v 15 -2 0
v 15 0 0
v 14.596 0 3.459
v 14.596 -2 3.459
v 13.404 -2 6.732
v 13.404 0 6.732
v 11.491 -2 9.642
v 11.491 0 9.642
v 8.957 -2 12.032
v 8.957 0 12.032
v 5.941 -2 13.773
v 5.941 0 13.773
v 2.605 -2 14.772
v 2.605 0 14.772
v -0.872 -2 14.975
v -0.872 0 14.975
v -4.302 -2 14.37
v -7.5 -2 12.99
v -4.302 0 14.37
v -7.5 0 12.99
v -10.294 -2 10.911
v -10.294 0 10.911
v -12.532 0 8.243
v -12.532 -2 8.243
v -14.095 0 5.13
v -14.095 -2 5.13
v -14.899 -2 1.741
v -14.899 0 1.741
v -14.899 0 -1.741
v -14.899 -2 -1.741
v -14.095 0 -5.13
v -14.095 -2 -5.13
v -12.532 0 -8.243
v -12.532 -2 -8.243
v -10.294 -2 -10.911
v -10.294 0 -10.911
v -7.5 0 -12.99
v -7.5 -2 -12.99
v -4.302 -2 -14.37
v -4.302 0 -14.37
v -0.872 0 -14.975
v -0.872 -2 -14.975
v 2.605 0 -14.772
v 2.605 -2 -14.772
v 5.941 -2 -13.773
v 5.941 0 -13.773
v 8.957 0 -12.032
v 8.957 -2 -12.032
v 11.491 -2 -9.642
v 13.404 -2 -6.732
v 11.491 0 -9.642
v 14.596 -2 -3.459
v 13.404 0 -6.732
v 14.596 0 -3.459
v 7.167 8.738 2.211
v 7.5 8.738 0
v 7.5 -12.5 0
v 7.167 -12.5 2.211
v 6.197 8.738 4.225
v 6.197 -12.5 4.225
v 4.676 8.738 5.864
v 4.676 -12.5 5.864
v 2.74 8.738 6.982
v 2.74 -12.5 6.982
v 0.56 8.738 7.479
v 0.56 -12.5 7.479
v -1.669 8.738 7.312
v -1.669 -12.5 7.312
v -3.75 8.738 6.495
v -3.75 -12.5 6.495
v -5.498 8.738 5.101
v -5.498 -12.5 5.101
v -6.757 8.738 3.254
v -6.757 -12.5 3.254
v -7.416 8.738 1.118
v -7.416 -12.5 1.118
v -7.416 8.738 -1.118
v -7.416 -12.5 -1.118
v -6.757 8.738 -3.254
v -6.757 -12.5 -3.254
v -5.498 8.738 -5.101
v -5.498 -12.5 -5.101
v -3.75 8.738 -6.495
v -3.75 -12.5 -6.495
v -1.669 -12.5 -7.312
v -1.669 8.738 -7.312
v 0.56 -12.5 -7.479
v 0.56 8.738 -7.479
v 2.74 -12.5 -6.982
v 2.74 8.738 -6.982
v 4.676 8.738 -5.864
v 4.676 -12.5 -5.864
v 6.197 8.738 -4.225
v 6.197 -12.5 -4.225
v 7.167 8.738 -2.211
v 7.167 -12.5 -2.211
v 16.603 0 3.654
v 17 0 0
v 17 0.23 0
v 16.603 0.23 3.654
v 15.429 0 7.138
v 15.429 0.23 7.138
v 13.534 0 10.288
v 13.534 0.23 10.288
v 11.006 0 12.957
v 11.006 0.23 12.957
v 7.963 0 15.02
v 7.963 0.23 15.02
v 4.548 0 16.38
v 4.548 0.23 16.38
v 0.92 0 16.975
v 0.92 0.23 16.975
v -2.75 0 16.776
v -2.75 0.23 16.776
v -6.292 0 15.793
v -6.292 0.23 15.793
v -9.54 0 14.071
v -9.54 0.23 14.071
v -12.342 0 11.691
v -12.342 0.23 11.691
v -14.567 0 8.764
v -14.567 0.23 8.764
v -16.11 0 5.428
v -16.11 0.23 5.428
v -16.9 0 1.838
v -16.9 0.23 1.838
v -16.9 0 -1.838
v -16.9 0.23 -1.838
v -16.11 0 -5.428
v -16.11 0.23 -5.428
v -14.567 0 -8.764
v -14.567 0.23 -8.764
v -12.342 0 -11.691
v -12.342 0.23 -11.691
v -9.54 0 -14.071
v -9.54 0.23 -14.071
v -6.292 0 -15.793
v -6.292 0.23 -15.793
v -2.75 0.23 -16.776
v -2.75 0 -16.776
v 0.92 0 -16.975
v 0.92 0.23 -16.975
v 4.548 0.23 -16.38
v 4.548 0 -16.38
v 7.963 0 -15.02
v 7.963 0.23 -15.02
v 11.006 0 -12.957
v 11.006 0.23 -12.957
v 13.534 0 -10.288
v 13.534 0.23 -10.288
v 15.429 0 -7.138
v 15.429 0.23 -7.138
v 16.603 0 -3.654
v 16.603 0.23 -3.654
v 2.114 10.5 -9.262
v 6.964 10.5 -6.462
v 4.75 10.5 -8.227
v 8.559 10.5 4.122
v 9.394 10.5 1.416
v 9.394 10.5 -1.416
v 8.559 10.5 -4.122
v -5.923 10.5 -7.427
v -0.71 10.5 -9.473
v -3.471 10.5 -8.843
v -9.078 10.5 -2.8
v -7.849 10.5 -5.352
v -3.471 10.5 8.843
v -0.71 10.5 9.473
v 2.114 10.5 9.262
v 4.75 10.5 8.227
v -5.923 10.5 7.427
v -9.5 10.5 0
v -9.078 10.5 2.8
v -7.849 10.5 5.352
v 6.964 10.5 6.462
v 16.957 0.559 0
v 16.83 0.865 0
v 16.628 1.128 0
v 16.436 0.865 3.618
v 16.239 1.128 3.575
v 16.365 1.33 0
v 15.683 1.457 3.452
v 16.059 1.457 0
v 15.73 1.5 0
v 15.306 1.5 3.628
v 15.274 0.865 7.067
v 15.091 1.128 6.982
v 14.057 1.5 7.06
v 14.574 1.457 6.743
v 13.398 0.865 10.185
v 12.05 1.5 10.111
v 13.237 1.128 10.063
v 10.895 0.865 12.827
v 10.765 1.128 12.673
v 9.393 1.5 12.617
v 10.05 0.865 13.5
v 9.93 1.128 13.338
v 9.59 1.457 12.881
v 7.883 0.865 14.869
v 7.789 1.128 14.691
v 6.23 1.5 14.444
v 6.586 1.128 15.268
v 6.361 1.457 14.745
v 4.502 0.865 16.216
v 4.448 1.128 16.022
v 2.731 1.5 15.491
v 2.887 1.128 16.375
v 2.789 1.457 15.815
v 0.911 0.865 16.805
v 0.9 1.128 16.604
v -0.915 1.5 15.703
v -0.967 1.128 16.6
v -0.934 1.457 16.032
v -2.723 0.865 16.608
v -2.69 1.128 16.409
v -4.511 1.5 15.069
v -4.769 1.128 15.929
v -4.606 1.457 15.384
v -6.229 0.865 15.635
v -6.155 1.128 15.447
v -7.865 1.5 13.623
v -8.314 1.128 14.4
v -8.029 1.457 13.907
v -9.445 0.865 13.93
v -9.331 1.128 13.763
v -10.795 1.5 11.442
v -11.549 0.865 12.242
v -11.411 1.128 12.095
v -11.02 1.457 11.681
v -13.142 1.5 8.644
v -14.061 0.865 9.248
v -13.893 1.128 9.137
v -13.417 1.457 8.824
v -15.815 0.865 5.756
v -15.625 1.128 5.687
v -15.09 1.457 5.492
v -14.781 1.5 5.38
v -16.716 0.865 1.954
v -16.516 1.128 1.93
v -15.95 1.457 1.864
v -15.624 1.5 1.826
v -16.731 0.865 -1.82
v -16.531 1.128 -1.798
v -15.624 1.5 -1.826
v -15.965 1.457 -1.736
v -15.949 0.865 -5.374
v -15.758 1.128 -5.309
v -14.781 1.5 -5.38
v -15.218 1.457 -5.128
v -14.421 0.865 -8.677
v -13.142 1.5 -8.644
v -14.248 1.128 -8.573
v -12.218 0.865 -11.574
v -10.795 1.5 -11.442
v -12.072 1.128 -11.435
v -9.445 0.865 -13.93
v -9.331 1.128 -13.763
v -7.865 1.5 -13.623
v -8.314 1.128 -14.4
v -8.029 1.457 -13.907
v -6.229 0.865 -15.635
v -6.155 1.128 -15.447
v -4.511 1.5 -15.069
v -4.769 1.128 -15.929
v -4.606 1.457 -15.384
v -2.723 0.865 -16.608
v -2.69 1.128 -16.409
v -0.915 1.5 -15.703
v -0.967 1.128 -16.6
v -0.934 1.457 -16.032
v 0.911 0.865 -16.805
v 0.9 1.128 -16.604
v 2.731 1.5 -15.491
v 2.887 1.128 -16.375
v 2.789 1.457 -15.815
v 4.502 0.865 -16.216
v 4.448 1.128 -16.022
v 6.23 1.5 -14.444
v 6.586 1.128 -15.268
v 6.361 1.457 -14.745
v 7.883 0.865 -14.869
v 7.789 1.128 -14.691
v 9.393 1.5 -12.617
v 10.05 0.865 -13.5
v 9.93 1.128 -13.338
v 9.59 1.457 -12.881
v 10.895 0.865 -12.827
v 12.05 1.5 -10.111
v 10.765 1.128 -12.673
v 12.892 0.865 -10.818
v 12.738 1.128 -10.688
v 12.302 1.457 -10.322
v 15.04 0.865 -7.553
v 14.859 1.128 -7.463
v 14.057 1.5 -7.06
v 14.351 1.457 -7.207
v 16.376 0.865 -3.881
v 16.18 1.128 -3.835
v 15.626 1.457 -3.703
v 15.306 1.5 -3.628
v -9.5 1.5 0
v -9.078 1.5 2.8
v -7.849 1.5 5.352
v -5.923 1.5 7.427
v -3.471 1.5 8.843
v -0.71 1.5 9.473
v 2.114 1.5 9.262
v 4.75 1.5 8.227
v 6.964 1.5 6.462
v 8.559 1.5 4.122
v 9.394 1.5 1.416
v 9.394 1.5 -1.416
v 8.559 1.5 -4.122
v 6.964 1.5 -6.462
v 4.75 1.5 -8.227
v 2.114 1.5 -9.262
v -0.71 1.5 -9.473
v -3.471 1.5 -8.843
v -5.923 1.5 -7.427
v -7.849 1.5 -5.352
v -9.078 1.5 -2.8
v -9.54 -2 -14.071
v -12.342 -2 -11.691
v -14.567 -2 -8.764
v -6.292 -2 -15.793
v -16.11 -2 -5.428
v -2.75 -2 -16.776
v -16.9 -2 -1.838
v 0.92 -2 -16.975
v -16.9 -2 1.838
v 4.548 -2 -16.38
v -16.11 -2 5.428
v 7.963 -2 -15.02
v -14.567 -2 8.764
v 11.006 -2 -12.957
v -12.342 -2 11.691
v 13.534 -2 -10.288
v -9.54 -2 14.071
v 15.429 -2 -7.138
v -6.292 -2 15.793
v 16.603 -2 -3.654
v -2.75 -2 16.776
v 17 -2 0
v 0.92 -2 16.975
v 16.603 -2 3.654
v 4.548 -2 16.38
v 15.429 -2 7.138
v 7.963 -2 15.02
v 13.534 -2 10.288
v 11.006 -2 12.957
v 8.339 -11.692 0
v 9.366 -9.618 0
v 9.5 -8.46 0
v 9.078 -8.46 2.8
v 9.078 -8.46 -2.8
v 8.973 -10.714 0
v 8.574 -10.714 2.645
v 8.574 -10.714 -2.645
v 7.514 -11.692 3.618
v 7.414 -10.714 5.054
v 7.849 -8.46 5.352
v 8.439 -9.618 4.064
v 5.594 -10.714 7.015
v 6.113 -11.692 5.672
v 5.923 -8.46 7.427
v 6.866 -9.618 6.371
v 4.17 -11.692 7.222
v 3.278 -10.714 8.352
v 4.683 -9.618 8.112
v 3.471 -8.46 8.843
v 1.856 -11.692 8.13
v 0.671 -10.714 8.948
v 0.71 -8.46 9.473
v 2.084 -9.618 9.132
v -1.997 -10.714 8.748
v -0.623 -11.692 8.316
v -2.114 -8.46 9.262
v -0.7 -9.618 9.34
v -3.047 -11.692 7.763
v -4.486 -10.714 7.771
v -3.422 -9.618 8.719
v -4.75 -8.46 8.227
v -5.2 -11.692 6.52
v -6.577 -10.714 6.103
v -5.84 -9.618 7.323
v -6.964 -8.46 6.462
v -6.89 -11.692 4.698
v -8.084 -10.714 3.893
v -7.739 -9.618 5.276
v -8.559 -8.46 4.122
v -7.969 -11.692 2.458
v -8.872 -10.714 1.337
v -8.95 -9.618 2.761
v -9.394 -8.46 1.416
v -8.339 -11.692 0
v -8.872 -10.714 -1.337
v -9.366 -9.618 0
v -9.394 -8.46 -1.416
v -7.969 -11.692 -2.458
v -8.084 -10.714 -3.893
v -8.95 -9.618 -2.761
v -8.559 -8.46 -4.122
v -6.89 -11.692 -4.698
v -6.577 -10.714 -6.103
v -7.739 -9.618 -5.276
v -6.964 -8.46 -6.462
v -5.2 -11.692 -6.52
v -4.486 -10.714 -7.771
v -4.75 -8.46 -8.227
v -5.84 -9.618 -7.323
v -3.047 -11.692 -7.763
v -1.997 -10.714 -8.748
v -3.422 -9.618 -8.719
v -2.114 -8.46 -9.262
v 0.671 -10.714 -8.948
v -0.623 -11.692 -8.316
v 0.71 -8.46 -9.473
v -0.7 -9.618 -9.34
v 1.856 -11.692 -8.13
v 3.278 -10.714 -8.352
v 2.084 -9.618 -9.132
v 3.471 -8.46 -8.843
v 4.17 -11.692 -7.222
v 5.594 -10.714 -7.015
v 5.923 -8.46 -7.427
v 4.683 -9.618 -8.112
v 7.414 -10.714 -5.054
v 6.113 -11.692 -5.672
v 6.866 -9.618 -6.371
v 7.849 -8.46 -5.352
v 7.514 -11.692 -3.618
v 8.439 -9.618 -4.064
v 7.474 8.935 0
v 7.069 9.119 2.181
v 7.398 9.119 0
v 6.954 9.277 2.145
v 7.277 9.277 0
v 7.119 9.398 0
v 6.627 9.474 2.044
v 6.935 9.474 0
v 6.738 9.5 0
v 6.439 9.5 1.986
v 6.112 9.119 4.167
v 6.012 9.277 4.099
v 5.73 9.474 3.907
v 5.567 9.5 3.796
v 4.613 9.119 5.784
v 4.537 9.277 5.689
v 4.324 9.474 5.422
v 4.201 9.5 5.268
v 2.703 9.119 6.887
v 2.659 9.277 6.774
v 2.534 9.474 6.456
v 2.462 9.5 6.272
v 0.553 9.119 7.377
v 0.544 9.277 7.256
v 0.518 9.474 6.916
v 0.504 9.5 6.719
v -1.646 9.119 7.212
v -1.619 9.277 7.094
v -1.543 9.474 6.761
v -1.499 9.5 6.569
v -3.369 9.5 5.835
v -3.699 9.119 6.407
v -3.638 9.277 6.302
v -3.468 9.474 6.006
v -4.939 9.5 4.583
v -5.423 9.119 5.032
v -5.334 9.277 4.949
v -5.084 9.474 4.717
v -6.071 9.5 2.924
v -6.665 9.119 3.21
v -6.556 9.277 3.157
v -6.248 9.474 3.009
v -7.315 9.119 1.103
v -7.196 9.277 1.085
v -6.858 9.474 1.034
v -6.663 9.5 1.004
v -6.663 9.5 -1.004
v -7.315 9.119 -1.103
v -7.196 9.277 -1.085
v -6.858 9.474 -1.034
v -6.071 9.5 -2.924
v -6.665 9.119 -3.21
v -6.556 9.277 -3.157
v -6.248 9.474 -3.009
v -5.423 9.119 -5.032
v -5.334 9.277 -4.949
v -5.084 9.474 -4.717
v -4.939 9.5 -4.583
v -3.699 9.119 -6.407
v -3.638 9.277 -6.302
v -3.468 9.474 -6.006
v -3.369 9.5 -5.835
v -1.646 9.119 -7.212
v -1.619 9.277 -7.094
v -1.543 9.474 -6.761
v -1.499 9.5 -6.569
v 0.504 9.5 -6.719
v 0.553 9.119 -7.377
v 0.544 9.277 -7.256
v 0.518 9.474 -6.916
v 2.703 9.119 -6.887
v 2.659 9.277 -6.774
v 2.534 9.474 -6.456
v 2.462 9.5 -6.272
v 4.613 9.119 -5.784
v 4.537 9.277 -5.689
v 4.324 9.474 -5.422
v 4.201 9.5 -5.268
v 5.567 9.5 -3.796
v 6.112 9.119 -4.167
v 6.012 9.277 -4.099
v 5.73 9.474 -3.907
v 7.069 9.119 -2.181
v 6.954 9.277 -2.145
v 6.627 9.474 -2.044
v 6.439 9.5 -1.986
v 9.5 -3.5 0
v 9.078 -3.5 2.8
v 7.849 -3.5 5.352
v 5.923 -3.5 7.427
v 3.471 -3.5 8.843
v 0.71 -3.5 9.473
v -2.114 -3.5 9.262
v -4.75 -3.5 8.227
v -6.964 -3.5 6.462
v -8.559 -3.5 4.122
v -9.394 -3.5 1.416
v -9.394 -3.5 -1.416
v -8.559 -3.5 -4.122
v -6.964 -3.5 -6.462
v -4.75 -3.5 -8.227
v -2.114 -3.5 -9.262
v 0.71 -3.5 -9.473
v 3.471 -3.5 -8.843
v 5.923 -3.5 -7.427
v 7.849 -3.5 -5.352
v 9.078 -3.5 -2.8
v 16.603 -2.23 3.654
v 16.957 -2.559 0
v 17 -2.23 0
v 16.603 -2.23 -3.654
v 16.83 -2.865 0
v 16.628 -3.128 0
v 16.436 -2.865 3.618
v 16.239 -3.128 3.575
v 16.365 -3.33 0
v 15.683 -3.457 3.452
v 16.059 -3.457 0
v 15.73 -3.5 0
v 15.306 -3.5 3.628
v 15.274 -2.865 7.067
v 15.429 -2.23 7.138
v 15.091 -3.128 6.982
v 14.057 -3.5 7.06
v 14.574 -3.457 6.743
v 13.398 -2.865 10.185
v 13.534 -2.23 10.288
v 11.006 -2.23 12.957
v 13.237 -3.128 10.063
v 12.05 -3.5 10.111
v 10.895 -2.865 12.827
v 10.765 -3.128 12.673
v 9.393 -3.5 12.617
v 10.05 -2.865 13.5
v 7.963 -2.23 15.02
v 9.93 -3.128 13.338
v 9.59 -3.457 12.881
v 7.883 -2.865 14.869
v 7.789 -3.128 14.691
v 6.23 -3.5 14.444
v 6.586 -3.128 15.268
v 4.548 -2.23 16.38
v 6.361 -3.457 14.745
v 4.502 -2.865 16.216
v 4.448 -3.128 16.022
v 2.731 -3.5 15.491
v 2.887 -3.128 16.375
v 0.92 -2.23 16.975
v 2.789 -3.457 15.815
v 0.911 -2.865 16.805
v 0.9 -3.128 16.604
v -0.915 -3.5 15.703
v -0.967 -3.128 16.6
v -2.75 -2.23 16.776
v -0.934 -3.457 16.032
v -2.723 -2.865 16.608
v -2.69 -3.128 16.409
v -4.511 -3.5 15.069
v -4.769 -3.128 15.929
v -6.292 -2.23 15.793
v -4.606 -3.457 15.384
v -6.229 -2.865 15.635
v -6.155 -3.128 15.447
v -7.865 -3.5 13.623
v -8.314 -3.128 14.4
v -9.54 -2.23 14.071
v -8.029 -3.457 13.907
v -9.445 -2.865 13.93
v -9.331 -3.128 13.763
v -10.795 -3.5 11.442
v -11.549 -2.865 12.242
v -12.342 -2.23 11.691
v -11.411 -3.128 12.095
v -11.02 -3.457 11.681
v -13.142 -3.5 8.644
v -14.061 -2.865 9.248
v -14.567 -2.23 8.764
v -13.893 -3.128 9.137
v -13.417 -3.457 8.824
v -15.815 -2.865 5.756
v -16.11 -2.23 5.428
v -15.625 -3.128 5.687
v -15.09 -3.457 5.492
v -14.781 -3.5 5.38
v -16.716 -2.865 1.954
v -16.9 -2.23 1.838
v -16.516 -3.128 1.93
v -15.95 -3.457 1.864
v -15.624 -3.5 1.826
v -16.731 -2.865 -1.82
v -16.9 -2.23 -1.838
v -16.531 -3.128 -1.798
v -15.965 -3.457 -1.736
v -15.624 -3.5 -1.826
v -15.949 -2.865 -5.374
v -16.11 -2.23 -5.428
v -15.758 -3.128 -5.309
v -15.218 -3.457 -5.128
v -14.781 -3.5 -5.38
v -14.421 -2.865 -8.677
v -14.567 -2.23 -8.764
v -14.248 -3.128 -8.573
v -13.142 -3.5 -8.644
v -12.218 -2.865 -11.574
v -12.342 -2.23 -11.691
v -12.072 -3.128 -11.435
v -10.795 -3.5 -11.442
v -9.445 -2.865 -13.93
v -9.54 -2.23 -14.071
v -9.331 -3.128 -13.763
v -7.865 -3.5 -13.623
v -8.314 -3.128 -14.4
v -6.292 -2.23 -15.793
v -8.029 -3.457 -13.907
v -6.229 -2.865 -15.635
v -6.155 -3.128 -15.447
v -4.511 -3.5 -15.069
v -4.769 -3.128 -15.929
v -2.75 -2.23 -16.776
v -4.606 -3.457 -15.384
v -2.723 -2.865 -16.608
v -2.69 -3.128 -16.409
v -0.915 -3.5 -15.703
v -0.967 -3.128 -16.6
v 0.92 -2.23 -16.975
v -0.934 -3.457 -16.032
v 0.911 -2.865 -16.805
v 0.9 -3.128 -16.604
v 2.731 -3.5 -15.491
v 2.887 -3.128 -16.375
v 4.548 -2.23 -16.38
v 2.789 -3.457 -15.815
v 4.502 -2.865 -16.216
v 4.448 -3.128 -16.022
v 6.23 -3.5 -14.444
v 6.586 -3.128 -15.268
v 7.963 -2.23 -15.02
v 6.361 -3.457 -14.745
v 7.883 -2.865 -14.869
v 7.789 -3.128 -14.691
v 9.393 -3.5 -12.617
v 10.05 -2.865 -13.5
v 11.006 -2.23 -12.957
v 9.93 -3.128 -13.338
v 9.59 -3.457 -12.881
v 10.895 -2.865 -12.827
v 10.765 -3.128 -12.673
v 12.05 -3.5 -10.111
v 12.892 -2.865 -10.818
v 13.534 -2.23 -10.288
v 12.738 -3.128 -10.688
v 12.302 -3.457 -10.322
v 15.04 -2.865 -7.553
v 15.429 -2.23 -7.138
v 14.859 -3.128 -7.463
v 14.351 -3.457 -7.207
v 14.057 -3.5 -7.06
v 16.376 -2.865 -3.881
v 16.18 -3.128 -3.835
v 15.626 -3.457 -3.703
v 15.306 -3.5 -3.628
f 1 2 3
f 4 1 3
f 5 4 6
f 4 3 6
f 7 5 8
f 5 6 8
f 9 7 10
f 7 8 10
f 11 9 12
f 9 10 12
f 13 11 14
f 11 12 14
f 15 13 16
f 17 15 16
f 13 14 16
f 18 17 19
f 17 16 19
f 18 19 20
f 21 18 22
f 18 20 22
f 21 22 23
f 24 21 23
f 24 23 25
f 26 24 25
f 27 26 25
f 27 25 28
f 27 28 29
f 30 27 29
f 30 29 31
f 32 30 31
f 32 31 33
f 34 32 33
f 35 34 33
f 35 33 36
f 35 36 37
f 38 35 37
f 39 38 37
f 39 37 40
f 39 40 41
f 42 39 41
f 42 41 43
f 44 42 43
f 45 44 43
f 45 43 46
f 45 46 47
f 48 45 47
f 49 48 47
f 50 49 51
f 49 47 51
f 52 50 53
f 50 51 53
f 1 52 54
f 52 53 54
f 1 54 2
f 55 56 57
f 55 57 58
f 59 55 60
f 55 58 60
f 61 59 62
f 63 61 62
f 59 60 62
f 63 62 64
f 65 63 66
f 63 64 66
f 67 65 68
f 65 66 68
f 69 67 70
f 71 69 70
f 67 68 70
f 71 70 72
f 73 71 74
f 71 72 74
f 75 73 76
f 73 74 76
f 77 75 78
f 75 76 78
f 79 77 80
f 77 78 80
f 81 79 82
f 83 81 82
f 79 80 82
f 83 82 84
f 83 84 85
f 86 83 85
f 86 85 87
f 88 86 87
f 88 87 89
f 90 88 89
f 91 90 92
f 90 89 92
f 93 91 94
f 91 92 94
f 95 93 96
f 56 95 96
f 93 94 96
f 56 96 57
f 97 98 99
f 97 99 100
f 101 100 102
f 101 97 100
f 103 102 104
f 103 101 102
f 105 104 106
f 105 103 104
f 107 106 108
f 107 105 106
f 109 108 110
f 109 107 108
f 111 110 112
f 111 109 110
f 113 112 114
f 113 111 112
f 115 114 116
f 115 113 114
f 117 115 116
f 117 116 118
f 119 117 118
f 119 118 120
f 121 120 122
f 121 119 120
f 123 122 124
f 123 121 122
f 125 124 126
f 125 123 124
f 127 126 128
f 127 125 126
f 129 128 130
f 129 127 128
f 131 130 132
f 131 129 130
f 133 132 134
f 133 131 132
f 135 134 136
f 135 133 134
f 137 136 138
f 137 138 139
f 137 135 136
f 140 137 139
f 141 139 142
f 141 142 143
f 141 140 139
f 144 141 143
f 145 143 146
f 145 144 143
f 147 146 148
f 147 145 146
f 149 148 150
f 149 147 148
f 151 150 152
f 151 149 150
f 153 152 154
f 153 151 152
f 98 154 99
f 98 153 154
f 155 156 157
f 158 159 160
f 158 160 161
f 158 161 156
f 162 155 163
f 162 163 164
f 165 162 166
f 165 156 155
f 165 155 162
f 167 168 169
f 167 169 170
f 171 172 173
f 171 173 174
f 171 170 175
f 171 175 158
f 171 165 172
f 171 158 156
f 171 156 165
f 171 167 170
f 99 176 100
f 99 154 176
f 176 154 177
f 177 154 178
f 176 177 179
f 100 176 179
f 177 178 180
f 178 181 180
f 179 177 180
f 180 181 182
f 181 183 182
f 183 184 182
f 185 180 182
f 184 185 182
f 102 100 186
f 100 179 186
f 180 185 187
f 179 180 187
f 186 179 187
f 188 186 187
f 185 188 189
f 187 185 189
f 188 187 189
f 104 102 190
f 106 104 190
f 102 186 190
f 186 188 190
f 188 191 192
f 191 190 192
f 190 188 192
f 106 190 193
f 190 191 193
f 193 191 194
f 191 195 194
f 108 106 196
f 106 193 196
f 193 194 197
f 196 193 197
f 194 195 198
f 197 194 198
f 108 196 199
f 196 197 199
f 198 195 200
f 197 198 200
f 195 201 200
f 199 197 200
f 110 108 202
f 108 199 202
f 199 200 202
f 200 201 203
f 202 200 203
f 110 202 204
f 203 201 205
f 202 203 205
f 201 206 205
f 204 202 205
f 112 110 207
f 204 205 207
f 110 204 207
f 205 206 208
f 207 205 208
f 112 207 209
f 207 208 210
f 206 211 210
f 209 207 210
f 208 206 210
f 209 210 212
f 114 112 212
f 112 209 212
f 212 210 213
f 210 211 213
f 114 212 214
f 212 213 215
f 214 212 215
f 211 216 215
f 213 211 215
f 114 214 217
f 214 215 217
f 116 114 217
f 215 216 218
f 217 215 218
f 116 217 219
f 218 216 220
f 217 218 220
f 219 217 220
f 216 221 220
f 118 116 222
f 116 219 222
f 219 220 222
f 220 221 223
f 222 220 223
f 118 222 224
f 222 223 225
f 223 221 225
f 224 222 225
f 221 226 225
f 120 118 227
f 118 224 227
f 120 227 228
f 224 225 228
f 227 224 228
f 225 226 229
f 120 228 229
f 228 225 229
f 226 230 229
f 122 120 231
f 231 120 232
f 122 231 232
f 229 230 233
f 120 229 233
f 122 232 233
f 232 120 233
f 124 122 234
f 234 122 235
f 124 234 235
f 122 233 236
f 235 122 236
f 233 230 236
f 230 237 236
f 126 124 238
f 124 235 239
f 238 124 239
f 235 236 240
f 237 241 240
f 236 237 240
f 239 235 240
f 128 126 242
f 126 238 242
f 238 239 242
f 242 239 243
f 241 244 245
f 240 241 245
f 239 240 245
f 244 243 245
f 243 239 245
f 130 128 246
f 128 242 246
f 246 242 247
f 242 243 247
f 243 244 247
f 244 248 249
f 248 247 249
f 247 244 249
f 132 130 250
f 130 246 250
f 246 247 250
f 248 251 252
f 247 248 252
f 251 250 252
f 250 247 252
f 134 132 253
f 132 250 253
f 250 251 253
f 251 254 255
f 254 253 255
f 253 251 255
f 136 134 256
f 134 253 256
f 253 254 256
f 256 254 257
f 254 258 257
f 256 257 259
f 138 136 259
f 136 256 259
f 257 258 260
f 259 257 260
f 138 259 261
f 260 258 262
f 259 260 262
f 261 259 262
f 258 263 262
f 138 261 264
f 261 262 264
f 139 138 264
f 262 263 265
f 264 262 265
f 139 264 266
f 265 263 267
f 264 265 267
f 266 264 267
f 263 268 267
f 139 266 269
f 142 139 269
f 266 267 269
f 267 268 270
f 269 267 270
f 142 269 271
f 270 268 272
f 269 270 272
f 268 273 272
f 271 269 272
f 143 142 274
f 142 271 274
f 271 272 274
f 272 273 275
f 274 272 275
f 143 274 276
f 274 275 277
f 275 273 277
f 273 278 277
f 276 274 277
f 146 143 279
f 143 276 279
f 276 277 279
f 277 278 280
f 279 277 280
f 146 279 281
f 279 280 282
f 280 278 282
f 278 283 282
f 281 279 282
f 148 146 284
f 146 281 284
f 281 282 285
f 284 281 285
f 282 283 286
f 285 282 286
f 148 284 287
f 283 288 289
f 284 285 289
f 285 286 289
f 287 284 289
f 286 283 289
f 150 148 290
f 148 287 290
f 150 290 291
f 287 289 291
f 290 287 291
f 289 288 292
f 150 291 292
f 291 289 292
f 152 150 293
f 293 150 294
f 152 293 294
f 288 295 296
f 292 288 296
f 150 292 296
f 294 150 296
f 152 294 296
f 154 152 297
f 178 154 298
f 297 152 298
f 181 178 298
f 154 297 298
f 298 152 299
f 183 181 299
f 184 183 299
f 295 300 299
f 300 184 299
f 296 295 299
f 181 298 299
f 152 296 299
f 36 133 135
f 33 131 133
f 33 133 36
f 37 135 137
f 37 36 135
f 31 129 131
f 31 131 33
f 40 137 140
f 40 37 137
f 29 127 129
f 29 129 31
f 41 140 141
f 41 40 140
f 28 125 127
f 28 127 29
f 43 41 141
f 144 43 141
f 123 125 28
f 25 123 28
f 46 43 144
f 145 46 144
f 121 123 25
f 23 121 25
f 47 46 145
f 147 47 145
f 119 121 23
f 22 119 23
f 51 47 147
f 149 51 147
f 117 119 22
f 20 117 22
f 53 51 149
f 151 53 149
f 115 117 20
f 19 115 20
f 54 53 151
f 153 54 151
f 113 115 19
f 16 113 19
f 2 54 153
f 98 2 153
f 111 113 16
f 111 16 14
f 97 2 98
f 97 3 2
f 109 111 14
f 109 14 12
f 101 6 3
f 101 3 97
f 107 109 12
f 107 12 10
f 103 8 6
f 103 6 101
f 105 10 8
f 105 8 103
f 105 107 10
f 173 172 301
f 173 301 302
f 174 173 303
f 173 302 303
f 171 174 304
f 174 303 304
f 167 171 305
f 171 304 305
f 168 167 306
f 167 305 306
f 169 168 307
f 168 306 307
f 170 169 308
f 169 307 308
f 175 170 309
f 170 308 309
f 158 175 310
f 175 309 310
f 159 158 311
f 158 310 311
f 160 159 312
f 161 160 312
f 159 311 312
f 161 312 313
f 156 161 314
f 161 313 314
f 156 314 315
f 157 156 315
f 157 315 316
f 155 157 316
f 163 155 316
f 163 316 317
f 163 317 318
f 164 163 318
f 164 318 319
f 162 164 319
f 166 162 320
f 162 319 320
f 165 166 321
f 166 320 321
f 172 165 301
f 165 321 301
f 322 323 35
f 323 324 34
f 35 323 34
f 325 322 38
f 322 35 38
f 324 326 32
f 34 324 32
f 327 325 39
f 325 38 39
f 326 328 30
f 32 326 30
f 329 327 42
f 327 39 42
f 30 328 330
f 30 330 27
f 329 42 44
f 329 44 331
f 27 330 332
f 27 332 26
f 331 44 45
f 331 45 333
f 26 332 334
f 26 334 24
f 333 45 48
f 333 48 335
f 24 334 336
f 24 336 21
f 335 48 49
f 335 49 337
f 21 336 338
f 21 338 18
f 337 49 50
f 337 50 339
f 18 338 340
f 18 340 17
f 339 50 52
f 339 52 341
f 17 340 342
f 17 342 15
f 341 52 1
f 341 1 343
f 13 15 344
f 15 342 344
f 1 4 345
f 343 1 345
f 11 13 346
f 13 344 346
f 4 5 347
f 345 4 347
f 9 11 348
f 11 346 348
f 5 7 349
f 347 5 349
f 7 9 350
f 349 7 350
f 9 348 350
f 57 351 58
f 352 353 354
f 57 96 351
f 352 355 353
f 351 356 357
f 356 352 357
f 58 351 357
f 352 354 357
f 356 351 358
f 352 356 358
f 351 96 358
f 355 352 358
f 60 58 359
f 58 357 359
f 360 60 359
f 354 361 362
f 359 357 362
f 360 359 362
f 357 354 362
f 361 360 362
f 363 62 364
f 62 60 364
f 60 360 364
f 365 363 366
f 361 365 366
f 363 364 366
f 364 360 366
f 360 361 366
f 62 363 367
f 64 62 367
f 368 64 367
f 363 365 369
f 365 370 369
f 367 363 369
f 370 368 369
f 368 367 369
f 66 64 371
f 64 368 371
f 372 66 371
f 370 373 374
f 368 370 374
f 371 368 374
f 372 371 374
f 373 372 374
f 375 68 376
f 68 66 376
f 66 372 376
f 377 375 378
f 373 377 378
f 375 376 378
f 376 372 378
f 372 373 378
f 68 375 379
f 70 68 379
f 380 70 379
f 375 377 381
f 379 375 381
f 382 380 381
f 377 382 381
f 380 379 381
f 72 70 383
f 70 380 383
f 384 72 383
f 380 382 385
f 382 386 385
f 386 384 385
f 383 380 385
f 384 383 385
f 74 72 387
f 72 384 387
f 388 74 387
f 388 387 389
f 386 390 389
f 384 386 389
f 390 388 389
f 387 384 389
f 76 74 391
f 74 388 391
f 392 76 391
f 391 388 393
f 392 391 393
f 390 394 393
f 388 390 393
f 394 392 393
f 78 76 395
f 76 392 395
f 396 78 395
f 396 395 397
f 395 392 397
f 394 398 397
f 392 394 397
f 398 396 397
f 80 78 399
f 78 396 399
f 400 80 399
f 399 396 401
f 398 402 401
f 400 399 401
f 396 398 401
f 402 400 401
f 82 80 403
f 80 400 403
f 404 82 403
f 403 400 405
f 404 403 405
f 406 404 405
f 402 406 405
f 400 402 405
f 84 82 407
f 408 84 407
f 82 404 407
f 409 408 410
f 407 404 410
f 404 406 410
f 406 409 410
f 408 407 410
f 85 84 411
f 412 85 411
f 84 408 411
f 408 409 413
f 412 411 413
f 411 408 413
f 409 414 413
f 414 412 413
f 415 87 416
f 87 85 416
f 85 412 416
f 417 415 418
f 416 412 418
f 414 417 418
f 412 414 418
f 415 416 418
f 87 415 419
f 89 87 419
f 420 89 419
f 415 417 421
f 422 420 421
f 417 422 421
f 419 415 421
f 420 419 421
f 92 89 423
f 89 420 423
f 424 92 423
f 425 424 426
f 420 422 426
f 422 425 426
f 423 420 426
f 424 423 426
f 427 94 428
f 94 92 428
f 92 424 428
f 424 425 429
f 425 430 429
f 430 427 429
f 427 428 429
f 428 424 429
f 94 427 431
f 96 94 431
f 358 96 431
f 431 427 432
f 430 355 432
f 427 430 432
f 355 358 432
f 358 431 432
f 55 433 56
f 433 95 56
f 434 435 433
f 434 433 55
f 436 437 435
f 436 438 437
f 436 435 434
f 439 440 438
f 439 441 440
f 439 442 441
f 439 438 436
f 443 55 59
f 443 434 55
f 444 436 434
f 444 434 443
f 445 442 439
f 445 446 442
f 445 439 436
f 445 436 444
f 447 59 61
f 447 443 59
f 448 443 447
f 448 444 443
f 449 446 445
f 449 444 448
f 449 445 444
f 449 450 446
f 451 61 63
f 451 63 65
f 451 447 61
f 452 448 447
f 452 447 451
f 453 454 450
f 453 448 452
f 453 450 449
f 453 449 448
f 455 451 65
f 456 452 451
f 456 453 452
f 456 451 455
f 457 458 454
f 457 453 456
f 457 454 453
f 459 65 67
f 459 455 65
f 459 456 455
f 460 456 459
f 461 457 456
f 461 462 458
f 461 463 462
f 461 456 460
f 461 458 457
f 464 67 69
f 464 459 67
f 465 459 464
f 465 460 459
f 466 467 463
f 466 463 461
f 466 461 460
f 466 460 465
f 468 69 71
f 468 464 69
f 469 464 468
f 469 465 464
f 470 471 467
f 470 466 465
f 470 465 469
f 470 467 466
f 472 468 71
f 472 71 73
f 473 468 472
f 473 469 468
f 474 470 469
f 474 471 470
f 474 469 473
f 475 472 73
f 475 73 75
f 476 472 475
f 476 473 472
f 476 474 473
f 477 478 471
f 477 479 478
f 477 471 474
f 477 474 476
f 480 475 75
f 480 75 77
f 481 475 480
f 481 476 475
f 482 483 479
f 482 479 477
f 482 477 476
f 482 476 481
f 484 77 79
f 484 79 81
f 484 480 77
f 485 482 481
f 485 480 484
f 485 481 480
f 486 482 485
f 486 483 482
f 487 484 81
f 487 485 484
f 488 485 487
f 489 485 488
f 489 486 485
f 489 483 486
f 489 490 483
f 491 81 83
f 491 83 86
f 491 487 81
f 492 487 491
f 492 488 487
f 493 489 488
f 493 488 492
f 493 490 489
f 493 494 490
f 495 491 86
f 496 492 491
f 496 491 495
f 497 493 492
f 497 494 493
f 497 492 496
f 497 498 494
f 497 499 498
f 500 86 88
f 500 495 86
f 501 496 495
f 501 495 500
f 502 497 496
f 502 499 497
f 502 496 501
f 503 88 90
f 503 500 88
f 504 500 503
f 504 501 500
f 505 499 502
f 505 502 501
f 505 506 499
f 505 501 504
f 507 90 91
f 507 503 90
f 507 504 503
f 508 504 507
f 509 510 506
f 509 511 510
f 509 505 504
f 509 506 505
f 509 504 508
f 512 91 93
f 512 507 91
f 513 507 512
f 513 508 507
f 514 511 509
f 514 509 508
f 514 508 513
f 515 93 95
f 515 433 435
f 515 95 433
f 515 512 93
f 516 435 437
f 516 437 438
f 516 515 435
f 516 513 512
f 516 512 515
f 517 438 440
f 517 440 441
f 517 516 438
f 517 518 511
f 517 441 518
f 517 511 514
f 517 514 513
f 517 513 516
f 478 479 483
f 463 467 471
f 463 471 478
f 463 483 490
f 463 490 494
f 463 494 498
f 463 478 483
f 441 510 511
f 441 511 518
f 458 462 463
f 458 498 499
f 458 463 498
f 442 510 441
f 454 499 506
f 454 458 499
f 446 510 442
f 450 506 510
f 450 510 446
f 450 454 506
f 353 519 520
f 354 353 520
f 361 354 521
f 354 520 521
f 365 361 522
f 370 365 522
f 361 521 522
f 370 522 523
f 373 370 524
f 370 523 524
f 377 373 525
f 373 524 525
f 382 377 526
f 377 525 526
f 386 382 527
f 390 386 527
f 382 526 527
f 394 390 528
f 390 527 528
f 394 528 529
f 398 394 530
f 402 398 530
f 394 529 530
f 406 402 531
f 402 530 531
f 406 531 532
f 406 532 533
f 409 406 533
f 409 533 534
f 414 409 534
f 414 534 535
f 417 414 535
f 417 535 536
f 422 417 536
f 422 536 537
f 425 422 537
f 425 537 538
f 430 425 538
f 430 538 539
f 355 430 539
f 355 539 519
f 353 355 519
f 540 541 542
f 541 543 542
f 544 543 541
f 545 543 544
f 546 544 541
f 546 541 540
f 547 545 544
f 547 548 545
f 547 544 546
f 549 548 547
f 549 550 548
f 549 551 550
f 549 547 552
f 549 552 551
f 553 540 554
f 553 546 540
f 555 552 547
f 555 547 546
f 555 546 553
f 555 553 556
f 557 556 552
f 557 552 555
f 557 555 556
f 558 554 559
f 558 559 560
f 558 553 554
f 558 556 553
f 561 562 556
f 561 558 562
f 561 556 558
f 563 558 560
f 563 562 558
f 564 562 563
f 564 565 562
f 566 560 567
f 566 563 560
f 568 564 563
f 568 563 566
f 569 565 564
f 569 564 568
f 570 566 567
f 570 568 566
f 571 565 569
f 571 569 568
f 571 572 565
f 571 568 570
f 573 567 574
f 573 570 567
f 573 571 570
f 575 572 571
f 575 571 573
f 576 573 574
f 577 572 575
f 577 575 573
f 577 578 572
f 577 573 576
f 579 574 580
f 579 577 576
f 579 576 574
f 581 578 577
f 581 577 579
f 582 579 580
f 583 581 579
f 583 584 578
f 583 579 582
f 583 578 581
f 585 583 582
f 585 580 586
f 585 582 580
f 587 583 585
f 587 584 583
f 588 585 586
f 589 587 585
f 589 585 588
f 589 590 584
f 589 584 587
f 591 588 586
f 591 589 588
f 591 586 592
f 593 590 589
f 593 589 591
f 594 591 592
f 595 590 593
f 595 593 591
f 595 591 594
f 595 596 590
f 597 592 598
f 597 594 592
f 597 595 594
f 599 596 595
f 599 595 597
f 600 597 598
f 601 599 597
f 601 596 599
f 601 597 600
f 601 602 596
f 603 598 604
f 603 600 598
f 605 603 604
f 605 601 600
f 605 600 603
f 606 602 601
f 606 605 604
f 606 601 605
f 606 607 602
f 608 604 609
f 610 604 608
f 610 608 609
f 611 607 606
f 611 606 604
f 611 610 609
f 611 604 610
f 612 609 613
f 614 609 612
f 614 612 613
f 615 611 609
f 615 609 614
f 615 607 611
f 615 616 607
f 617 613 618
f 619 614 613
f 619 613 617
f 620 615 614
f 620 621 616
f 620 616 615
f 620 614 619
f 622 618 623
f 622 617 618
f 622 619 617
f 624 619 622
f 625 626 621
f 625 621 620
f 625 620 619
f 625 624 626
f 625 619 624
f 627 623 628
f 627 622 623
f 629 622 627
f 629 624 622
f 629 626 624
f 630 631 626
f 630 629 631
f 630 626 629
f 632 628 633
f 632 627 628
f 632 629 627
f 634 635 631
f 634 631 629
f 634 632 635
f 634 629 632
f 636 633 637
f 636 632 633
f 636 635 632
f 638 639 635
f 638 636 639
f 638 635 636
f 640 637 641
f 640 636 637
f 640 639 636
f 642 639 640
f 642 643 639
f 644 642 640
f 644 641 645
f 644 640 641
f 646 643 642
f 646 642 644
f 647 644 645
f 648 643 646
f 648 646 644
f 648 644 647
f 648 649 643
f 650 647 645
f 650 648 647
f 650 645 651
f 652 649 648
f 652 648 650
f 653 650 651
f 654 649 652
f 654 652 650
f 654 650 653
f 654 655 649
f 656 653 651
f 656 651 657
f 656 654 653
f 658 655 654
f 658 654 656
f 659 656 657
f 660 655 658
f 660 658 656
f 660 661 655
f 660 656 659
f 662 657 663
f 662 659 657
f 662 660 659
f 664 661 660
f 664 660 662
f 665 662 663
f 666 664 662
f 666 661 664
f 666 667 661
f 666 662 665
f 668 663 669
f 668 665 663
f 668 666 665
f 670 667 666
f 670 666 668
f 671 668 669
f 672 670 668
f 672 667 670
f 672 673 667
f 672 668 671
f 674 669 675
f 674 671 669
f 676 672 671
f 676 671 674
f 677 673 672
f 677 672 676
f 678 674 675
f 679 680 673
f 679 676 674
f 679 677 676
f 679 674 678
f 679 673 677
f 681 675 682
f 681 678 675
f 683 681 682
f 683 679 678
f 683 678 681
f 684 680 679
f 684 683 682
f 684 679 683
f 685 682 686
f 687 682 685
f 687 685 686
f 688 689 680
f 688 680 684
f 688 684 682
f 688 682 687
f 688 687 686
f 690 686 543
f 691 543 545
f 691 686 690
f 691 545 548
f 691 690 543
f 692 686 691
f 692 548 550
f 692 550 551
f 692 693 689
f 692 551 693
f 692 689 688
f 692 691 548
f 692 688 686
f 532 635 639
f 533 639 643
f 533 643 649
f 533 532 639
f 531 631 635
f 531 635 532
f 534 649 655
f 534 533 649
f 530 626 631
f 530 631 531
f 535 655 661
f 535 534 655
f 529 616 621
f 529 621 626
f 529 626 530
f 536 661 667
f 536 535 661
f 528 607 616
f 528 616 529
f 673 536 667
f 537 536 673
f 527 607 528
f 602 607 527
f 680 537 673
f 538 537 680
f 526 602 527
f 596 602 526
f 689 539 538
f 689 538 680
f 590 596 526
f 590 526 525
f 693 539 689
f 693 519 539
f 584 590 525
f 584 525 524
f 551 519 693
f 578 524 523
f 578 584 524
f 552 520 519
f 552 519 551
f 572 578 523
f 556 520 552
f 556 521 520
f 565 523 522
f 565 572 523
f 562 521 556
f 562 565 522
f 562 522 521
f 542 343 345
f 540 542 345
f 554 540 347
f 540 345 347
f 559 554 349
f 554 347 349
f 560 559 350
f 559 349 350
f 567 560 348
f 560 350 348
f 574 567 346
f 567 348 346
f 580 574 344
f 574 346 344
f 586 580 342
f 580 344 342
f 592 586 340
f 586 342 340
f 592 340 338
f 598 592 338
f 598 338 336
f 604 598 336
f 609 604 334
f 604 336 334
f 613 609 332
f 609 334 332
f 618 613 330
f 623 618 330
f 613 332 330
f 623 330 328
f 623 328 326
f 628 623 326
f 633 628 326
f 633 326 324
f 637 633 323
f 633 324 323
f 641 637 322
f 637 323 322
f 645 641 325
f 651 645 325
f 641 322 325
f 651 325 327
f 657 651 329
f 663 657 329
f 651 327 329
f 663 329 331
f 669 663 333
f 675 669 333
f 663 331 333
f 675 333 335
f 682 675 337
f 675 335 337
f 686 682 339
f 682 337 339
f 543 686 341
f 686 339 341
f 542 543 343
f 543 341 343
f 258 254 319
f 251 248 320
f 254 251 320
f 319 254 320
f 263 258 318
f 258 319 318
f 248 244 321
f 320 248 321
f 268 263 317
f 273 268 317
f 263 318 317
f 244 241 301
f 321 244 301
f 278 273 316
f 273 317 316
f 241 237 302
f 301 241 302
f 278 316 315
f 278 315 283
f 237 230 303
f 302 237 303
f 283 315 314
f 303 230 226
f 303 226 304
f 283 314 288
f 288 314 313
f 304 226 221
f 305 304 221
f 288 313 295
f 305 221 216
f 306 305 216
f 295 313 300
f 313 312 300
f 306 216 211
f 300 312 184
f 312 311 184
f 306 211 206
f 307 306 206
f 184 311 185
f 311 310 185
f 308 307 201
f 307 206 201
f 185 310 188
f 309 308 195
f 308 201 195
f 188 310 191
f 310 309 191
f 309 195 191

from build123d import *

# Parameters (mm, degrees)
F0_R      = 15
F1_DEPTH  = 2
F2_R      = 17
F2_R_2    = 15
F3_DEPTH  = 1.5
F4_R      = 17
F4_R_2    = 15
F5_DEPTH  = 1.5
F6_R      = 1.27
F7_R      = 9.5
F8_DEPTH  = 9
F9_R      = 9.5
F10_DEPTH = 9
F11_R     = 7.5
F12_DEPTH = 22
F13_R     = 0.762


# Not quite as in the source:
# - a fillet or chamfer that OpenCascade refuses, or shapes differently, is made with other operations: its cross-section is extruded or revolved along the edge and cut away or added
# - a pattern or mirror of a feature is missing from the dataset's text; its kind, count and spacing are read off the source's solid


with BuildPart() as f1:
    # F0 (on Front) → F1 (new body)
    with BuildSketch(Plane.XZ):
        Circle(F0_R)
    extrude(amount=F1_DEPTH)

    # F2 (on face) → F3 (join)
    with BuildSketch(Plane.XZ.offset(2)):
        Circle(F2_R)
        Circle(F2_R_2, mode=Mode.SUBTRACT)
        Circle(F2_R_2)
    f3 = extrude(amount=F3_DEPTH)

    # F3_copies: F3 across plane
    add(f3.mirror(Plane.ZX.offset(-1)))

    # F4 (on face) → F5 (join)
    with BuildSketch(Plane(origin=(0, 0, 0), x_dir=(-1, 0, 0), z_dir=(0, 1, 0))):
        Circle(F4_R)
        Circle(F4_R_2, mode=Mode.SUBTRACT)
    extrude(amount=F5_DEPTH)

    # F6
    f6_edges = [f1.edges().sort_by_distance(p)[0] for p in [
        (-17, -3.5, 0),
        (-17, 1.5, 0),
    ]]
    fillet(f6_edges, radius=F6_R)

    # F7 (on face) → F8 (join)
    with BuildSketch(Plane.XZ.offset(3.5)):
        Circle(F7_R)
    extrude(amount=F8_DEPTH)

    # F9 (on face) → F10 (join)
    with BuildSketch(Plane(origin=(0, 1.5, 0), x_dir=(-1, 0, 0), z_dir=(0, 1, 0))):
        Circle(F9_R)
    extrude(amount=F10_DEPTH)

    # F11 (on face) → F12 (cut)
    with BuildSketch(Plane.XZ.offset(12.5)):
        Circle(F11_R)
    extrude(amount=-F12_DEPTH, mode=Mode.SUBTRACT)

    # F13
    f13_edges = [f1.edges().sort_by_distance(p)[0] for p in [
        (-7.5, 9.5, 0),
    ]]
    fillet(f13_edges, radius=F13_R)

    # F14: fillet of radius 5.08 on 1 edges, made by hand

    # F14_s1 → F14_t2 (revolve, cut)
    with BuildSketch(Plane.XY):
        with BuildLine():
            ThreePointArc((7.5, -12.5), (8.9726256161, -10.7140835586), (9.5, -8.4601980247))
            Line((9.5, -8.4601980247), (9.5, -12.5))
            Line((9.5, -12.5), (7.5, -12.5))
        make_face()
    revolve(axis=Axis((0, -12.5, 0), (0, -1, 0)), mode=Mode.SUBTRACT)


solid = f1.part
